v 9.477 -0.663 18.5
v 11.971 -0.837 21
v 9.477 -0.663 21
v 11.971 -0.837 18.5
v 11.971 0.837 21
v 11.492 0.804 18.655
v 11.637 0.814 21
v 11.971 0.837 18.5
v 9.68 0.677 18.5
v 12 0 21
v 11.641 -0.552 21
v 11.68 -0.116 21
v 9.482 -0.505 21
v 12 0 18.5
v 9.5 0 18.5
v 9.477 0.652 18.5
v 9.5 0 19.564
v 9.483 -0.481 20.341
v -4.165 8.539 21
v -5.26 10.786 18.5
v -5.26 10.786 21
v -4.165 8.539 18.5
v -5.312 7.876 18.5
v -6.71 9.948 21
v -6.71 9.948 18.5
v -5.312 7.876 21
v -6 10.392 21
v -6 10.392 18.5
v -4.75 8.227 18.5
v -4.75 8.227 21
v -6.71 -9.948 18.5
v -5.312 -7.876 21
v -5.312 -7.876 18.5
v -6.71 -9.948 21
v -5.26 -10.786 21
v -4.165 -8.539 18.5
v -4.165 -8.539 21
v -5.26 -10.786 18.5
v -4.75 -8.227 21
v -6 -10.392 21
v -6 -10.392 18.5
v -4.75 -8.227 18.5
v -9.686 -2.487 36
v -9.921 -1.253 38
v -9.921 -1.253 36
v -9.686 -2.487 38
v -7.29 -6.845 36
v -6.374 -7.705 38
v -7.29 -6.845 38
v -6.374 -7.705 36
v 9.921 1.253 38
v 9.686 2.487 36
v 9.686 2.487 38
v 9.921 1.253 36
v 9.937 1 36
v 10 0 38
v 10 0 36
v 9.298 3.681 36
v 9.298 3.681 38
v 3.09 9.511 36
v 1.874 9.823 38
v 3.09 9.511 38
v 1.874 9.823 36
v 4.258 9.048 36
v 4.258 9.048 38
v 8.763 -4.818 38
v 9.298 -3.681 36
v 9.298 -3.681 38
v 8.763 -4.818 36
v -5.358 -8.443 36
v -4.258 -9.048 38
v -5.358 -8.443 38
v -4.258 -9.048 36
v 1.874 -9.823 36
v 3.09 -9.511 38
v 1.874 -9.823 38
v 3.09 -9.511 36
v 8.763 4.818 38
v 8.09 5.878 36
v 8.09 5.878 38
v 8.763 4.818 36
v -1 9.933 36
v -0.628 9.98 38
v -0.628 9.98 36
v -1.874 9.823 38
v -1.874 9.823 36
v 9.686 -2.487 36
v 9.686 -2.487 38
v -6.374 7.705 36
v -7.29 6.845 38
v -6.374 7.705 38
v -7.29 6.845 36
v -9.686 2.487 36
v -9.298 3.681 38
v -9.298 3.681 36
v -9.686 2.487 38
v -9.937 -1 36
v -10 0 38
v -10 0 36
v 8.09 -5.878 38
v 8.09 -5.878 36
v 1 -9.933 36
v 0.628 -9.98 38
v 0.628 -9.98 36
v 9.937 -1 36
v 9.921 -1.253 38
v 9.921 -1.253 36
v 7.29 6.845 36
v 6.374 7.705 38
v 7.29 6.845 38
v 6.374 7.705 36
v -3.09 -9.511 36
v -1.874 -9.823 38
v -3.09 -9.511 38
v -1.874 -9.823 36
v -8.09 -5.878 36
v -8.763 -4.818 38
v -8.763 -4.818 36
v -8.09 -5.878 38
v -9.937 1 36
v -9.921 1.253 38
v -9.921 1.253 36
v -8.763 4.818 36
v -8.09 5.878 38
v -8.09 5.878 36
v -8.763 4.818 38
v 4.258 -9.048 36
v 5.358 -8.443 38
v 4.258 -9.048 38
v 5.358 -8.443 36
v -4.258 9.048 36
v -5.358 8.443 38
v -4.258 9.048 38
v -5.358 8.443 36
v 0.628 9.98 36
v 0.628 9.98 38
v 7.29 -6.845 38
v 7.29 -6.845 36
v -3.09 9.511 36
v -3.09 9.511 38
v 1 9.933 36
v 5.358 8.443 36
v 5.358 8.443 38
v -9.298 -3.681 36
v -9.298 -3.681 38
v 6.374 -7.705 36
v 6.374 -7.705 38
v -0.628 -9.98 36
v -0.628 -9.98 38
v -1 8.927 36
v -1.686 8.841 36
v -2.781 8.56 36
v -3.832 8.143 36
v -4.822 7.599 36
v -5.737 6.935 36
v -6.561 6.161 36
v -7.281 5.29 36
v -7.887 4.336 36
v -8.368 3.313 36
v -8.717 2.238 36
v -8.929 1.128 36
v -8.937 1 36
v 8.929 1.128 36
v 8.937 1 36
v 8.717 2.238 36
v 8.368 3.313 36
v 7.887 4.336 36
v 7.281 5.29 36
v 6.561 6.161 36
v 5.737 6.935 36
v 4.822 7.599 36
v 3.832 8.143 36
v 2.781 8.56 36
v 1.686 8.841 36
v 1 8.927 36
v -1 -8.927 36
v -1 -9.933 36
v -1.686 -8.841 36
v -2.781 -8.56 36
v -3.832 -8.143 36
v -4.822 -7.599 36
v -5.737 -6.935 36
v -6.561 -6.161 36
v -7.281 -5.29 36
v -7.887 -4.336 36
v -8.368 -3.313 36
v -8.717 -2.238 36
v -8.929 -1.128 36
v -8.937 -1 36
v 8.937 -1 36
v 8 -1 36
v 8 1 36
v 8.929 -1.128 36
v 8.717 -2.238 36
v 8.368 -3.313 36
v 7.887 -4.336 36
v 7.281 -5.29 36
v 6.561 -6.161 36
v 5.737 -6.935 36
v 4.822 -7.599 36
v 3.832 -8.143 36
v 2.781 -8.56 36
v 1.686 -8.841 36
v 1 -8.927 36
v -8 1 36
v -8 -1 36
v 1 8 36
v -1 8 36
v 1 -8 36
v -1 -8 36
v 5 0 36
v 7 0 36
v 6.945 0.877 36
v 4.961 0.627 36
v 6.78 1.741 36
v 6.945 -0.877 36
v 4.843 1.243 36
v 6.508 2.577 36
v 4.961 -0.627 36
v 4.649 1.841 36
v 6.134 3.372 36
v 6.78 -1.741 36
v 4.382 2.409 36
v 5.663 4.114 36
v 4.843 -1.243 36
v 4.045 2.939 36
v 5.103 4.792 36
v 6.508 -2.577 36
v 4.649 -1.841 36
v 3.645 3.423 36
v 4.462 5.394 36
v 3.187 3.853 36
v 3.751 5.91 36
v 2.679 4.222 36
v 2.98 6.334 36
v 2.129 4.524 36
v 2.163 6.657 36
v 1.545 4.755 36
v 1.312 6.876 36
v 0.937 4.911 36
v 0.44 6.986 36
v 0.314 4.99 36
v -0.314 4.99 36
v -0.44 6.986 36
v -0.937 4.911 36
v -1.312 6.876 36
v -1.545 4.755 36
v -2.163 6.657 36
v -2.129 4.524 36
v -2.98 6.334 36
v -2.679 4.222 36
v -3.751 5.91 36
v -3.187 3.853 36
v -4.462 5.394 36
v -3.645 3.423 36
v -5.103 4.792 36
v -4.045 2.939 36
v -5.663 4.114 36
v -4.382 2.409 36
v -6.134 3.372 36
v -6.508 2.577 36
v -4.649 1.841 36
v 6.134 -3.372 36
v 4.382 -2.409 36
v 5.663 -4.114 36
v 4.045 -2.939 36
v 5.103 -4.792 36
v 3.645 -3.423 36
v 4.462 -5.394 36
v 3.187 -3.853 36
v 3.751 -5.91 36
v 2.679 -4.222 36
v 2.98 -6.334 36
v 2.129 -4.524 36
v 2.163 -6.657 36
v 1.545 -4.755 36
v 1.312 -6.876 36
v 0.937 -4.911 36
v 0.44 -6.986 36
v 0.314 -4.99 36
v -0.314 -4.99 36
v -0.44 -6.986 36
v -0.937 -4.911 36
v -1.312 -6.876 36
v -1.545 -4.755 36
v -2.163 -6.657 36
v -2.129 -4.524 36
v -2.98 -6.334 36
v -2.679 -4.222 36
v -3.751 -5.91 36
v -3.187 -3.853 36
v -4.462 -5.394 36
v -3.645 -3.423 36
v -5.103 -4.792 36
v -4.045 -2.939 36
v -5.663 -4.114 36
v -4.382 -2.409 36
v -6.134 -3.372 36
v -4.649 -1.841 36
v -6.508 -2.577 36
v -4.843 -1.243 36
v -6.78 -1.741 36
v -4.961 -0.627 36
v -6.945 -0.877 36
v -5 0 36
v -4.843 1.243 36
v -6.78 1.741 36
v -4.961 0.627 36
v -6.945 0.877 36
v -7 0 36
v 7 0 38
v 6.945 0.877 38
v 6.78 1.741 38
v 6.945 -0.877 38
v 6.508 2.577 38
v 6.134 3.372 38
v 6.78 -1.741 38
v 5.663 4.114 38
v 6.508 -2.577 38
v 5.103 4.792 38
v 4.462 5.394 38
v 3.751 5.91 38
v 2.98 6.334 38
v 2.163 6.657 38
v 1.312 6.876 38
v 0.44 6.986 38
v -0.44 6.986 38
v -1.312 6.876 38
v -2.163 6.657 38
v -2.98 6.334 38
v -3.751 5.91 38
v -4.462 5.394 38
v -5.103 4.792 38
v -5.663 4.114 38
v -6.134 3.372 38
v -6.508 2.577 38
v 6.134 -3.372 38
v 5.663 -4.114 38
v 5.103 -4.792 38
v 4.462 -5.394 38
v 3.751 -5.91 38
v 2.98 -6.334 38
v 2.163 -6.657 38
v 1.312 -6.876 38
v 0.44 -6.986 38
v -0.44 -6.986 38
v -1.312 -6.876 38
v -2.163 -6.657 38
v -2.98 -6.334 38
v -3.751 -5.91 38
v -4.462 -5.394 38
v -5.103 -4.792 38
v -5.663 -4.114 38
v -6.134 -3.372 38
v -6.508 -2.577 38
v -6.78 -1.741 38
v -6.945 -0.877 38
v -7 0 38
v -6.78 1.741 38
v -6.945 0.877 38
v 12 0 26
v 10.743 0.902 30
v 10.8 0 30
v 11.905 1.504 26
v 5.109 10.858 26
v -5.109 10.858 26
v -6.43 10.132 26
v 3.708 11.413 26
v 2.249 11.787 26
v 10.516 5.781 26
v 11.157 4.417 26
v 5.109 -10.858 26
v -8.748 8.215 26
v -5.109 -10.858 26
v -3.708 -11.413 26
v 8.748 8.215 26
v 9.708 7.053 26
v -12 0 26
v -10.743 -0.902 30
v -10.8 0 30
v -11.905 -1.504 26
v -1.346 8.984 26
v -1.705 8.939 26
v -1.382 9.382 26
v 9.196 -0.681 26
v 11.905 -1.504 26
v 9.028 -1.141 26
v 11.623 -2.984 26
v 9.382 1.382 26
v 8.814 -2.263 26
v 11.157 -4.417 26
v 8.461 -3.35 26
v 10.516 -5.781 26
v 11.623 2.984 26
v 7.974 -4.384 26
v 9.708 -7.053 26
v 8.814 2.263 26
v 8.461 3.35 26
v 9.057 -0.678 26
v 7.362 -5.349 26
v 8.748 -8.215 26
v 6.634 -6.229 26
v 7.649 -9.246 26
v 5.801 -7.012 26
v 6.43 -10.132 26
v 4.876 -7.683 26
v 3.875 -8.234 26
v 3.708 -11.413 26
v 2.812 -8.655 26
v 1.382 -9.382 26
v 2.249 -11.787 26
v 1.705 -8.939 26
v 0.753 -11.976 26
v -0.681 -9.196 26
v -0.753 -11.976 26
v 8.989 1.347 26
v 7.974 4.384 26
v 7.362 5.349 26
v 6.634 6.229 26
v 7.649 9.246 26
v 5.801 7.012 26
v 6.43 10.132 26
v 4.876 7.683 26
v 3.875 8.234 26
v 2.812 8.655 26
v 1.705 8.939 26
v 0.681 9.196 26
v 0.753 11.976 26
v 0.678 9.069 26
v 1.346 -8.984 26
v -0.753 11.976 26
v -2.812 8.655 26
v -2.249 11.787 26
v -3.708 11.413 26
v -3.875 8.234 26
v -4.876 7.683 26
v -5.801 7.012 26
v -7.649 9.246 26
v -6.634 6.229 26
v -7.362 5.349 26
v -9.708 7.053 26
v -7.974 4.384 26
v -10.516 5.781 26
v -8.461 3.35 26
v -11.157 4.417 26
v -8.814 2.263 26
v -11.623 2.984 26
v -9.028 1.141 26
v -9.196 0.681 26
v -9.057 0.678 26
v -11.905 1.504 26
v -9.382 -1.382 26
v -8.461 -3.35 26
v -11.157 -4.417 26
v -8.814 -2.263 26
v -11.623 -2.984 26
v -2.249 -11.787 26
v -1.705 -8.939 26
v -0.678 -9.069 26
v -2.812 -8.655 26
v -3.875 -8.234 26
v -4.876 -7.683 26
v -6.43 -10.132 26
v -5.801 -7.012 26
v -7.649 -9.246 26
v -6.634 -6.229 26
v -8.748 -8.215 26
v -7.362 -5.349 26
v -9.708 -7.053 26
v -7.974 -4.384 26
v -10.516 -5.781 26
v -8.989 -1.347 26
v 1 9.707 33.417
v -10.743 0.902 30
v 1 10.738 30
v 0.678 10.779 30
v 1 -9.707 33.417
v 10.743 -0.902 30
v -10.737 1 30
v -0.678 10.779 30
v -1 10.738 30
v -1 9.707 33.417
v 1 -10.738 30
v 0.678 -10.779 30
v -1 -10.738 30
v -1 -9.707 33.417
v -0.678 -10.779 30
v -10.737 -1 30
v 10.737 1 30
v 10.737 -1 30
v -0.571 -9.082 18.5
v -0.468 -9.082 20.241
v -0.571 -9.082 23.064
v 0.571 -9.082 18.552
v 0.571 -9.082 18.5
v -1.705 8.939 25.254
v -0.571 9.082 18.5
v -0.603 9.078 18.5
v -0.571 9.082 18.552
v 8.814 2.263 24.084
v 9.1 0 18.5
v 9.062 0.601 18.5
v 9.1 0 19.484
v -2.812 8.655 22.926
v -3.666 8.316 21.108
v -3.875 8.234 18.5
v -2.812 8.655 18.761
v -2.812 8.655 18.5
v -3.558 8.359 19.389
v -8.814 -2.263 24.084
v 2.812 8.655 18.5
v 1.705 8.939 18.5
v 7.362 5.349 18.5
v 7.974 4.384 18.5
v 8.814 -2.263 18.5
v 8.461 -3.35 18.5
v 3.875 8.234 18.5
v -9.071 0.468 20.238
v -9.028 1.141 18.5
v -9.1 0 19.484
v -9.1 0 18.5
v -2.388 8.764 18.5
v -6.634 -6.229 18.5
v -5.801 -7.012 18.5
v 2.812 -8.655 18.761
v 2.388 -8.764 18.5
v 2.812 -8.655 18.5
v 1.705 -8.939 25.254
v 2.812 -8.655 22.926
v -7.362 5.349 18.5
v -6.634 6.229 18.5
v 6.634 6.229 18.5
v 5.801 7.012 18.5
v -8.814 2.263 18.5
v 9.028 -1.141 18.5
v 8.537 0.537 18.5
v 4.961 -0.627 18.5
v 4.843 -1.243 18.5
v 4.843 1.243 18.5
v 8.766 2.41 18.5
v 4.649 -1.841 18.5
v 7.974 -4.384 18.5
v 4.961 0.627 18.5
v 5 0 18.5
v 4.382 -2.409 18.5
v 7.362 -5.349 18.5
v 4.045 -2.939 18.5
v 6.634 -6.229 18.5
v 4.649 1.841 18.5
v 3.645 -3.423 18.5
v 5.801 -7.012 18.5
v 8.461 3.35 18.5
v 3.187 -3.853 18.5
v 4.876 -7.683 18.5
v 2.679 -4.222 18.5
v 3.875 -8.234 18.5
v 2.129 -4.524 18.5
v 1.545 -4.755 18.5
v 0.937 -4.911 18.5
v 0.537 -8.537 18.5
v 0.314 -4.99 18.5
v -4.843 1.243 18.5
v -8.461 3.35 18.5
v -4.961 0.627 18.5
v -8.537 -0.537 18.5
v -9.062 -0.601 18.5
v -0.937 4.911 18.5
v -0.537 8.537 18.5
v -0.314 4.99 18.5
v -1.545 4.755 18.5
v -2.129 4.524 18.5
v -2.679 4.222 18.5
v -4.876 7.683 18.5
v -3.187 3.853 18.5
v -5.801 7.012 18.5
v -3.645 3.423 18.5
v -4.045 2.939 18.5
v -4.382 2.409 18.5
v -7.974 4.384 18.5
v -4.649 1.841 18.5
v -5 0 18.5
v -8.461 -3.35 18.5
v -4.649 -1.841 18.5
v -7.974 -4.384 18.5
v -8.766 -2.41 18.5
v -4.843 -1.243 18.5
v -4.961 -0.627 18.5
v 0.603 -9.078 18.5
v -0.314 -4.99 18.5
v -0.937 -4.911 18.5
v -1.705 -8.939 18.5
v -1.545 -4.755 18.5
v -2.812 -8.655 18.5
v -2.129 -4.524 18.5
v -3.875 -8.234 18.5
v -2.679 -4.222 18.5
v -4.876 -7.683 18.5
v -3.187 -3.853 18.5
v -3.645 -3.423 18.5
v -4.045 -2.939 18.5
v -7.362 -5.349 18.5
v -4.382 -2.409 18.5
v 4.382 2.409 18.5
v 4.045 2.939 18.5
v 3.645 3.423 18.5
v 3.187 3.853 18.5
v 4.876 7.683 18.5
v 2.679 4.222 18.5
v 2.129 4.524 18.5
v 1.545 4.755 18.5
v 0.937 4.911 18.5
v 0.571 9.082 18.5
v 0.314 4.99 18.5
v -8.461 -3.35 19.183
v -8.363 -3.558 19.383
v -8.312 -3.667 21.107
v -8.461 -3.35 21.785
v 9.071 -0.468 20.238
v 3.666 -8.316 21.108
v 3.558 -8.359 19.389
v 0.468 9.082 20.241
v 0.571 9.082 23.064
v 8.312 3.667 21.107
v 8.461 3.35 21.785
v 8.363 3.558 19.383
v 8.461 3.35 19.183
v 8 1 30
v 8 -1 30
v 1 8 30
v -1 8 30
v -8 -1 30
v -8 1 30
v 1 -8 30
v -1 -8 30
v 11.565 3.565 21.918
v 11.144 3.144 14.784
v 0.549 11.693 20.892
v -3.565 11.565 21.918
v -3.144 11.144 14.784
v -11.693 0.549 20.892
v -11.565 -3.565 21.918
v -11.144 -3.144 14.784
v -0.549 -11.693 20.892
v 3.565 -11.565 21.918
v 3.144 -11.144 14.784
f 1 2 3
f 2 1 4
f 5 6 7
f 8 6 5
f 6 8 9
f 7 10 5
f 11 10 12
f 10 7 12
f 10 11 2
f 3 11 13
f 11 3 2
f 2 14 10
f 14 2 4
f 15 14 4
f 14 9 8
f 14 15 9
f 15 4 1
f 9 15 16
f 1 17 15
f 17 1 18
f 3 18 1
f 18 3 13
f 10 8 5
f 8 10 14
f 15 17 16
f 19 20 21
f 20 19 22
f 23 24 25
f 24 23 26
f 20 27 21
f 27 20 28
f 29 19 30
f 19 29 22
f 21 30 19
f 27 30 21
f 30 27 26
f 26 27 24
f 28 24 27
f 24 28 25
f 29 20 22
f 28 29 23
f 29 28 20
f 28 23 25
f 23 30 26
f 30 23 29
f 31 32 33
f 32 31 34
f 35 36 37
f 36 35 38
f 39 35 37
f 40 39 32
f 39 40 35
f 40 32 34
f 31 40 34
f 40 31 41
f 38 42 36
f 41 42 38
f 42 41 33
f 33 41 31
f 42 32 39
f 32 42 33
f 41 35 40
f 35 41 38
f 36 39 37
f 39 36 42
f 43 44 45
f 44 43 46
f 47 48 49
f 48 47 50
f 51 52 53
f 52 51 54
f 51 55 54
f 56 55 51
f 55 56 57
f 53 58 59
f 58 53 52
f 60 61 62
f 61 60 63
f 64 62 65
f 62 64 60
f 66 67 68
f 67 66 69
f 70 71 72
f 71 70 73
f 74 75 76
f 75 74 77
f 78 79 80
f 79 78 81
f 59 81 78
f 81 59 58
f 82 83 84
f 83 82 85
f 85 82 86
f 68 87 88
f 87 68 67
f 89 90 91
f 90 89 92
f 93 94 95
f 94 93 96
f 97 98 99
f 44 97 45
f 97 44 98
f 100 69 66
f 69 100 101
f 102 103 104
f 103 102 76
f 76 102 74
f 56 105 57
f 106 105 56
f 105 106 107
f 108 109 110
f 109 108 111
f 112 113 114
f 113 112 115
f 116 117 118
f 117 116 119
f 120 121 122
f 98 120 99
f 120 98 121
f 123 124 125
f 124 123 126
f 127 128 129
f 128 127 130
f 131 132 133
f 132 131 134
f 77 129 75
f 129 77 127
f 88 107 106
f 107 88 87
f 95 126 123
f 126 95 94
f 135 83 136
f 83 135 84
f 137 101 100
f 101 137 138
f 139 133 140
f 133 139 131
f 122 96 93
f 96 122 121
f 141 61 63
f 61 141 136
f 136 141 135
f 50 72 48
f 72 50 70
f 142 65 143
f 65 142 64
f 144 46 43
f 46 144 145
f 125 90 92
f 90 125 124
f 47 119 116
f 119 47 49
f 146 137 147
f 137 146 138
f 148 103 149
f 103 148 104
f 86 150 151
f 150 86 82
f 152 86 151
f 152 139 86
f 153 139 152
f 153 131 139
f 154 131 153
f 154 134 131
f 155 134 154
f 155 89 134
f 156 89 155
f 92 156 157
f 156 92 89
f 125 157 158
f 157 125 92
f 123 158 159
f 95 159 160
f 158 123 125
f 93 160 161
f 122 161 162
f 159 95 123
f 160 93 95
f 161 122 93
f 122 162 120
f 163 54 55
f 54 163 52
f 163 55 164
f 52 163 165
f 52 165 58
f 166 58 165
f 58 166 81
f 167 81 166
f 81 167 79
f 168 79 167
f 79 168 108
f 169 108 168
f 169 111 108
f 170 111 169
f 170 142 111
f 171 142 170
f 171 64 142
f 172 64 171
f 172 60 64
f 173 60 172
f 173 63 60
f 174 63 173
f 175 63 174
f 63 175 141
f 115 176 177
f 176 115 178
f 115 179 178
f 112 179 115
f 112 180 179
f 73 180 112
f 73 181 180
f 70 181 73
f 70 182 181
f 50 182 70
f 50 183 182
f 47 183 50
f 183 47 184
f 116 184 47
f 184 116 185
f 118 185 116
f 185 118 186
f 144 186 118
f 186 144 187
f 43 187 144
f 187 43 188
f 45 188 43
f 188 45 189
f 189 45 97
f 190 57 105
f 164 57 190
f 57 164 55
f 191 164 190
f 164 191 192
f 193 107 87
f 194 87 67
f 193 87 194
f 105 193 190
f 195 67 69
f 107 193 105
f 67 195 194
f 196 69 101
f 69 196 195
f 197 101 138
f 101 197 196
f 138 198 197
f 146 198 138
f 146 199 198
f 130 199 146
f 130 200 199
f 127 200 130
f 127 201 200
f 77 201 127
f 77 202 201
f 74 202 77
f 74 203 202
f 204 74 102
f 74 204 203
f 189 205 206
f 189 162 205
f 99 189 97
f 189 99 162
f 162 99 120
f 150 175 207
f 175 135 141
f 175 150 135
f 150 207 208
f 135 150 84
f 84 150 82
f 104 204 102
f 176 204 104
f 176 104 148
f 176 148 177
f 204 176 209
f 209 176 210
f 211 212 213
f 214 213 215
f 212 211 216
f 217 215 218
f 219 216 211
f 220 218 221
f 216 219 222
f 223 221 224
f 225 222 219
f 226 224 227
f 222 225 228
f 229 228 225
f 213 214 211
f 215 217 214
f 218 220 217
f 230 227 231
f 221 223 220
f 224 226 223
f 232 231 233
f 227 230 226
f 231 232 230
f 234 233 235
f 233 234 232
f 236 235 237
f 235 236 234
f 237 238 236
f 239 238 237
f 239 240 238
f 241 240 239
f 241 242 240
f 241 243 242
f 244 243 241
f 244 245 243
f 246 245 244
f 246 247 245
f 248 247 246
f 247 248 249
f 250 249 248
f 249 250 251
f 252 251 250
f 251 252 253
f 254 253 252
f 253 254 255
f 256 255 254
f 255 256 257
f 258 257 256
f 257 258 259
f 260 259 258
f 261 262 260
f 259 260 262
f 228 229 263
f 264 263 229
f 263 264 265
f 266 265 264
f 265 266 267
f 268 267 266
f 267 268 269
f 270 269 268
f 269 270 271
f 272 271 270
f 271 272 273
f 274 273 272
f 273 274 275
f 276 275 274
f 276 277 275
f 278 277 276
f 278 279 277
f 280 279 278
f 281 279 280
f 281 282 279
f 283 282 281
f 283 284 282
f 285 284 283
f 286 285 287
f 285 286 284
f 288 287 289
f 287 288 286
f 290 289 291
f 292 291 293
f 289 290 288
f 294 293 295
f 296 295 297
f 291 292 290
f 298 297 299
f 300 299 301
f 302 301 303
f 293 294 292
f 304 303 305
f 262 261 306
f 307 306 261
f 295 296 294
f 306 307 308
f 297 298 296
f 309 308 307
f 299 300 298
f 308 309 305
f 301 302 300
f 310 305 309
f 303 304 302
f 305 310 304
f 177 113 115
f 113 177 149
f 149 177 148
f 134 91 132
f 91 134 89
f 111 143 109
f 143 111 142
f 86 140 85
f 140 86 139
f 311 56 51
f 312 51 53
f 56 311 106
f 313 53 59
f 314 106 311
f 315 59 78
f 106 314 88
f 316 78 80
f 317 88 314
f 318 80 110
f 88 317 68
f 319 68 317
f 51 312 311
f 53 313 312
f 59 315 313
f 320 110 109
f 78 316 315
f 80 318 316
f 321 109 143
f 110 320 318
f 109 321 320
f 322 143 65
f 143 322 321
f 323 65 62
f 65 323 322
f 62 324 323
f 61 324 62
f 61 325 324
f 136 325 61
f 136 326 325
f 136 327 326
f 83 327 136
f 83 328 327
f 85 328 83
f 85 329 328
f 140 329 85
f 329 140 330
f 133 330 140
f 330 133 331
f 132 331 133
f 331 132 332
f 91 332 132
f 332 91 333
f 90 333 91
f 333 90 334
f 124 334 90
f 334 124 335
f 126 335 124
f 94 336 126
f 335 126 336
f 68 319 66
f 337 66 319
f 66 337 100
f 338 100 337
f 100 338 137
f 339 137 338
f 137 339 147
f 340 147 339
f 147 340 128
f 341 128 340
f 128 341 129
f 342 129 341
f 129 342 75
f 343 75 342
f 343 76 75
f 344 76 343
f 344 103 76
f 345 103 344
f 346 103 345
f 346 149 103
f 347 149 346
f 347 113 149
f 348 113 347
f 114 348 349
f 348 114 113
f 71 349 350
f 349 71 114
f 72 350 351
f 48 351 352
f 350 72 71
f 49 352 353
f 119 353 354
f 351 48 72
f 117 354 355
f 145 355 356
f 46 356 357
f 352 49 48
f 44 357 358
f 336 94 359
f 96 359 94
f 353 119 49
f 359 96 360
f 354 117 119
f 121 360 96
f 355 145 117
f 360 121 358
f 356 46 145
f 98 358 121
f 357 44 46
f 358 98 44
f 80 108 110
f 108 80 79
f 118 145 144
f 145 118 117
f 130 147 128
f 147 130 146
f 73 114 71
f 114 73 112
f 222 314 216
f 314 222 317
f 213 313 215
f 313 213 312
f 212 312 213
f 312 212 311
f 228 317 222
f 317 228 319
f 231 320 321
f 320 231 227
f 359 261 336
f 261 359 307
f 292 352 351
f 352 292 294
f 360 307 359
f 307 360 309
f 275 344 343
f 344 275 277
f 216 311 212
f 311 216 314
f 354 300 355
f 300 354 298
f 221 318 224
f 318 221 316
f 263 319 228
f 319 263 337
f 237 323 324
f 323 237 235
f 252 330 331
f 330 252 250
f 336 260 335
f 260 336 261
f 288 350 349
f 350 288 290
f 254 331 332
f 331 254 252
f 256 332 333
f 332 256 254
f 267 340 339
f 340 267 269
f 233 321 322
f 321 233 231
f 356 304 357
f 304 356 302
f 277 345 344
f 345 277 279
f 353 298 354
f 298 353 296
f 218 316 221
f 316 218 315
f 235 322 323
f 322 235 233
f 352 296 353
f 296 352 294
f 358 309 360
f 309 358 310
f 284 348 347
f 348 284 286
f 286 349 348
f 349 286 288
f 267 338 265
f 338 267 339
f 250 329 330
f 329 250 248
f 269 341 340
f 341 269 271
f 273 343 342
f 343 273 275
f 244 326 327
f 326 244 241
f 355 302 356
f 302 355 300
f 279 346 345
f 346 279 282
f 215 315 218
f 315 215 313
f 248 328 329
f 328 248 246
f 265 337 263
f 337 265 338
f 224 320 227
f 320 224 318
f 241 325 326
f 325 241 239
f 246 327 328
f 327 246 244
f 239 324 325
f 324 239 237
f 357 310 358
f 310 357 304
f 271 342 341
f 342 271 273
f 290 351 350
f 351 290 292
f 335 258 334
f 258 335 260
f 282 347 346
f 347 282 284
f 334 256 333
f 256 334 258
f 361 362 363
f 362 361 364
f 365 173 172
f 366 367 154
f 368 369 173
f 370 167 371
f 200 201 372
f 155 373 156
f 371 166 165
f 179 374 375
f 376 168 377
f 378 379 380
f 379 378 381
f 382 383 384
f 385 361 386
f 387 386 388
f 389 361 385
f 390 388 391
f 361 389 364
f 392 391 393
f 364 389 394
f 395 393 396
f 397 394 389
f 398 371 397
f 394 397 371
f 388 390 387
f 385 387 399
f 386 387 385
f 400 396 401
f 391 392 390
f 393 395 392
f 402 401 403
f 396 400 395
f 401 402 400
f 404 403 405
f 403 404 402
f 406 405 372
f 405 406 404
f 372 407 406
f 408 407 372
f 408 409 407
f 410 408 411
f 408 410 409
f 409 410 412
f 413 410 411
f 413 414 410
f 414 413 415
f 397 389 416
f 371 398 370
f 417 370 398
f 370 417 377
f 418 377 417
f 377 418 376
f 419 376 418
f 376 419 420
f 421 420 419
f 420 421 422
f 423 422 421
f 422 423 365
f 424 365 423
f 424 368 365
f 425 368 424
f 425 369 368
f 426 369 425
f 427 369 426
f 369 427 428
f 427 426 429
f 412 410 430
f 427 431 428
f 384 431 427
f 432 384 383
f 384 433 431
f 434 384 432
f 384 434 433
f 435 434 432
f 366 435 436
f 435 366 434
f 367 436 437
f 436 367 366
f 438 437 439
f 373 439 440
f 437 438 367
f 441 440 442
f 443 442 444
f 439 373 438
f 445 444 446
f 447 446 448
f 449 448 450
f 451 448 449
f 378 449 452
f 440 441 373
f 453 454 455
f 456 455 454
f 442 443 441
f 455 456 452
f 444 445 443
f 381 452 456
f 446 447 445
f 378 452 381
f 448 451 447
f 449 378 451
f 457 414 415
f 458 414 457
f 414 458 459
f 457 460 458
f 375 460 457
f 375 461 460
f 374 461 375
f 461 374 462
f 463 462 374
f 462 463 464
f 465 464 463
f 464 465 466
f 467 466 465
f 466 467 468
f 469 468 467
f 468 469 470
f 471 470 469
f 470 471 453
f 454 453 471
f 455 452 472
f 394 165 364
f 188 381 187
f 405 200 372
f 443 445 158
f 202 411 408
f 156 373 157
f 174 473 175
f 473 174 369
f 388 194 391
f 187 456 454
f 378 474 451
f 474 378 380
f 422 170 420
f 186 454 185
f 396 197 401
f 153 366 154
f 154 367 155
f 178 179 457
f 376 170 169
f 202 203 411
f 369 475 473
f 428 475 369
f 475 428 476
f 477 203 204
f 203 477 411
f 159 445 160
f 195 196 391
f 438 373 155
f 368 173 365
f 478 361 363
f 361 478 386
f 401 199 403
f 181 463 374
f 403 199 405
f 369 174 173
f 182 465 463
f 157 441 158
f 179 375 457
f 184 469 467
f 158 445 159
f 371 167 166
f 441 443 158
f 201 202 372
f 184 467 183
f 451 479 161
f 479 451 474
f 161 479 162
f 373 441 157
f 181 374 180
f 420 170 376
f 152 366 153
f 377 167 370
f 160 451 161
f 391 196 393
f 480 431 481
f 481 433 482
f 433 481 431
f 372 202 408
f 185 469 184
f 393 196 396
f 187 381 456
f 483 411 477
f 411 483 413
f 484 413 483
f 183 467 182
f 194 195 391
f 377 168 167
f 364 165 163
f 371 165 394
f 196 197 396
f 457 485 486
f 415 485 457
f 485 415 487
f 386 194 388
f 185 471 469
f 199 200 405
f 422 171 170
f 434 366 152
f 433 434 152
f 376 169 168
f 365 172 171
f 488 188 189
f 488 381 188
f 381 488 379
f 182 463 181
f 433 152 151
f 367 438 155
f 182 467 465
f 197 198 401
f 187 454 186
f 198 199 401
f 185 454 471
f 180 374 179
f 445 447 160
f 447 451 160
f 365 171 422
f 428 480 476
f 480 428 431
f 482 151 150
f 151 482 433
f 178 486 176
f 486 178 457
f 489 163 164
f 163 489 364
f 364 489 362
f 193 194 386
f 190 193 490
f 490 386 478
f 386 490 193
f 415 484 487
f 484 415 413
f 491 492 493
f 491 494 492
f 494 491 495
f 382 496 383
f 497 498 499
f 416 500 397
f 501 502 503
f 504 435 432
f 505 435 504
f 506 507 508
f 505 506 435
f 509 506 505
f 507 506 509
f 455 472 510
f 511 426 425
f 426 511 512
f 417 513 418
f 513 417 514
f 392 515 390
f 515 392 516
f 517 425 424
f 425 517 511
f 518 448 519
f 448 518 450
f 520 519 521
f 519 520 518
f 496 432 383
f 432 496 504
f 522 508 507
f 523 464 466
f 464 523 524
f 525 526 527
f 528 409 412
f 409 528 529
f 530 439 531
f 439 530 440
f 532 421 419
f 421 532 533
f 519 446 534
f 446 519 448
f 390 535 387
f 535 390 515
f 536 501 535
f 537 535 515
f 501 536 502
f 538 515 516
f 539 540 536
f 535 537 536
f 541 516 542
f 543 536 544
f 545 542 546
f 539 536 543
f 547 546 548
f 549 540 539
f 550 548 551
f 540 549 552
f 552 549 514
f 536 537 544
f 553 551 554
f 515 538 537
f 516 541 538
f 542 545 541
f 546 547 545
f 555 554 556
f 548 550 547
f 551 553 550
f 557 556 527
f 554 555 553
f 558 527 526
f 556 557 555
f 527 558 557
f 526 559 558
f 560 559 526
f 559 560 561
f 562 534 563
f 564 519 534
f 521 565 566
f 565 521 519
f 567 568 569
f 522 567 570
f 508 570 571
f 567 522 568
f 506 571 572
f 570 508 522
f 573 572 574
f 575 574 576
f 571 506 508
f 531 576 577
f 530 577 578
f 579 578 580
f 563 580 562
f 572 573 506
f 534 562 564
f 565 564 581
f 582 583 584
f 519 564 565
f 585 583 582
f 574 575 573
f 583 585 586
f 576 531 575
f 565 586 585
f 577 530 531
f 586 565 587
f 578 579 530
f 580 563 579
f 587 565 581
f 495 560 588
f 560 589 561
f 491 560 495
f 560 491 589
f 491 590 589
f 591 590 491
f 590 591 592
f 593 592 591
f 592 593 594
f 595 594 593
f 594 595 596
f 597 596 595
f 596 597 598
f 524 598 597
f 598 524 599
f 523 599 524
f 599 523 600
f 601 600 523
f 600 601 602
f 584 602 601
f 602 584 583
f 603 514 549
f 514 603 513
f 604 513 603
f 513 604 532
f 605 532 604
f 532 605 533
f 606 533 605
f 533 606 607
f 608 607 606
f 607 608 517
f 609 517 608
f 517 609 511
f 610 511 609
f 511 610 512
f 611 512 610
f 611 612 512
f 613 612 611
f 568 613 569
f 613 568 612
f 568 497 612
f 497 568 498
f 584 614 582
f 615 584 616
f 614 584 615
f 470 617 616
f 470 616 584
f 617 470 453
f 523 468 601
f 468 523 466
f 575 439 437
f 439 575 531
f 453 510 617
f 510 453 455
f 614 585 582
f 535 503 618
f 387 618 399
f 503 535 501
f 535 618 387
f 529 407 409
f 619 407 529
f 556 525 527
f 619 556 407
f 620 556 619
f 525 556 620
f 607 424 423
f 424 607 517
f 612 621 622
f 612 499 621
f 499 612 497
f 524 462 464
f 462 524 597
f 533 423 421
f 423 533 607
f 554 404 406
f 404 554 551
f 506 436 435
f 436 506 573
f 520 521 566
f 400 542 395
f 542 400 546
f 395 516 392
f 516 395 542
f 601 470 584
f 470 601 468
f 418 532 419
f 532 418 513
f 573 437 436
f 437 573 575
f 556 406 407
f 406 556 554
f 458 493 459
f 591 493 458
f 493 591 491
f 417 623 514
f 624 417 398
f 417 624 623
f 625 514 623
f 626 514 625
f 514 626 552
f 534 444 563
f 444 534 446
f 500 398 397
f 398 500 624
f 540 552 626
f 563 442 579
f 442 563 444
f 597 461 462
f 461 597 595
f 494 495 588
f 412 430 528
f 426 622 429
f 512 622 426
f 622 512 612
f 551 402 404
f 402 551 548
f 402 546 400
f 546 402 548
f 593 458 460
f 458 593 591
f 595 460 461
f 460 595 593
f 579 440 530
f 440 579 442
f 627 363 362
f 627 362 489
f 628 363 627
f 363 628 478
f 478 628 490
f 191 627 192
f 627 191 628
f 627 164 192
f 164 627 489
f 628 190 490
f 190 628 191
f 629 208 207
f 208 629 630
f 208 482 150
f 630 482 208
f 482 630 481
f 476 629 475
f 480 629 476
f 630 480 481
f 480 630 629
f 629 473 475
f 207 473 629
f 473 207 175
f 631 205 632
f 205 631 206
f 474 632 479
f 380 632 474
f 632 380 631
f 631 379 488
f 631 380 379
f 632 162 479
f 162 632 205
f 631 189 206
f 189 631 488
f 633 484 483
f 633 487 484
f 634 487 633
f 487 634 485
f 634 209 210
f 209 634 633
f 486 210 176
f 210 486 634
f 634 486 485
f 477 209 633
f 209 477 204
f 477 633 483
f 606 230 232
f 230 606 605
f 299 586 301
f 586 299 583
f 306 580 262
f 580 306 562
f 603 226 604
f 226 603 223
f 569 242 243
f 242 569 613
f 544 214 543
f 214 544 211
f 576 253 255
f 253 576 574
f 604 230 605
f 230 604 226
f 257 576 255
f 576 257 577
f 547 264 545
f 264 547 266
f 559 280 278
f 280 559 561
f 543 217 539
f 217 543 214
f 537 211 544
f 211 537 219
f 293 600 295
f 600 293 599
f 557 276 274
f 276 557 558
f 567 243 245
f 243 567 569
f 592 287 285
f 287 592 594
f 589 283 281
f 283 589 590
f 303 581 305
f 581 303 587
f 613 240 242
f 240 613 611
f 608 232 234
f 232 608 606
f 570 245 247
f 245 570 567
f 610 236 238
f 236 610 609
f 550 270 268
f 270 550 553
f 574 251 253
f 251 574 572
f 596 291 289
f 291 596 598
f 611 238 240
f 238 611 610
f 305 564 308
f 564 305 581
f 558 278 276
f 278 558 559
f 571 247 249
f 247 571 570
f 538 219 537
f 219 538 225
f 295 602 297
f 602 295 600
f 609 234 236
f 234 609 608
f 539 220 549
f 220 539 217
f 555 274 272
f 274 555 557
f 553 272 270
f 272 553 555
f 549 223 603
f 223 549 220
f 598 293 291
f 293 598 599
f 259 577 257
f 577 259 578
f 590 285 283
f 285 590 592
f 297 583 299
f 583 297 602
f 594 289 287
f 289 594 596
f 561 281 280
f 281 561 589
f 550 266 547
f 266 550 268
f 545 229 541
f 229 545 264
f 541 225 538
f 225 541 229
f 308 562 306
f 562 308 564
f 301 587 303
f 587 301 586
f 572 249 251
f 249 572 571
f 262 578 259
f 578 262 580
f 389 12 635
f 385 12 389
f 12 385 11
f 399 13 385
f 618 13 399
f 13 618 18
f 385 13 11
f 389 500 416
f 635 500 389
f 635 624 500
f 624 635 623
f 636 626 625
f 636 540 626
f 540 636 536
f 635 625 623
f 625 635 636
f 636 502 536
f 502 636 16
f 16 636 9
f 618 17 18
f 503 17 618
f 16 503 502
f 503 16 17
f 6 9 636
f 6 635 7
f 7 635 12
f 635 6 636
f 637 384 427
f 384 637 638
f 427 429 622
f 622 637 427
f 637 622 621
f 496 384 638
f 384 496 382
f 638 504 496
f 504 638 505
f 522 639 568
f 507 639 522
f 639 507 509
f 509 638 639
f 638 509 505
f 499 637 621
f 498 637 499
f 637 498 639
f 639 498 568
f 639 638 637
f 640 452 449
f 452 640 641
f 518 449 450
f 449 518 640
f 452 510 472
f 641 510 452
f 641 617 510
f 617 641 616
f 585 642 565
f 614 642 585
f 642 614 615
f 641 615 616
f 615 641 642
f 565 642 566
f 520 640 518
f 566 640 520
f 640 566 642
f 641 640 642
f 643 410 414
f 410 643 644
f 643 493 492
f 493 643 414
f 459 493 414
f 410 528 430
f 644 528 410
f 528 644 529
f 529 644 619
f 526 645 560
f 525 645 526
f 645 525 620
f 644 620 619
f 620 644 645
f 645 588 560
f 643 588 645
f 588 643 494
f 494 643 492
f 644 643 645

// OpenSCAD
// AETHERYTE – PART 2: COLLAR

$fn = 50;

base1_size = [70, 70, 10];
base2_size = [55, 55, 8];
base3_size = [40, 40, 6];

collar_radius = 9;
collar_height = 10;
tolerance = 0.4;
orb_r = 4;

bottom_crystal_length = 13;

bay_tab_count = 3;
bay_tab_w = 8;
bay_tab_h = 2.5;
bay_tab_r = collar_radius + 3;
bay_entry_h = 3;

base_top = base1_size[2] + base2_size[2] + base3_size[2];

union()
{
    collar();
    bottom_crystal();
}

module collar()
{
    difference()
    {
        union()
        {
            // main tapered collar body
            translate([0, 0, base_top + 2])
                cylinder(h = collar_height,
                         r1 = collar_radius + 3,
                         r2 = collar_radius, $fn = 50);

            // collar stem
            translate([0, 0, base_top - bay_entry_h - bay_tab_h])
                cylinder(h = bay_entry_h + bay_tab_h + 2,
                         r = bay_tab_r - bay_tab_h - tolerance, $fn = 50);

            // bayonet tabs
            for (i = [0 : bay_tab_count - 1])
            {
                rotate([0, 0, i * (360 / bay_tab_count)])
                rotate([0, 0, -bay_tab_w / 2])
                rotate_extrude(angle = bay_tab_w, $fn = 100)
                    translate([bay_tab_r - bay_tab_h,
                               base_top - bay_tab_h - bay_entry_h])
                        square([bay_tab_h, bay_tab_h]);
            }

            // decorative rim ring on collar top
            translate([0, 0, base_top + collar_height + 2])
            difference()
            {
                cylinder(h = 2, r = collar_radius + 1, $fn = 50);
                translate([0, 0, -1])
                    cylinder(h = 4, r = collar_radius - 2, $fn = 50);
            }
        }

        // hollow core
        translate([0, 0, base_top - bay_entry_h - bay_tab_h - 1])
            cylinder(h = collar_height + bay_entry_h + bay_tab_h + 6,
                     r = collar_radius - 4, $fn = 50);

        // hemispherical socket cup
        translate([0, 0, base_top + collar_height + 2])
            sphere(r = orb_r + tolerance, $fn = 40);

        // decorative vertical slots
        for (i = [0 : 3])
            rotate([0, 0, i * 90])
                translate([collar_radius - 1, -1, base_top + 6])
                    cube([4, 2, collar_height - 4]);
    }
}

// four downward shards around collar base
module bottom_crystal()
{
    for (i = [0 : 3])
    {
        rotate([0, 0, i * 90])
        translate([collar_radius - 1, 0, base_top + 3])
        rotate([0, 160, 45])
        union()
        {
            cylinder(h = bottom_crystal_length / 2,
                     r1 = 1, r2 = 3, $fn = 4);
            translate([0, 0, bottom_crystal_length / 2])
                cylinder(h = bottom_crystal_length / 2,
                         r1 = 3, r2 = 0, $fn = 4);
        }
    }
}
